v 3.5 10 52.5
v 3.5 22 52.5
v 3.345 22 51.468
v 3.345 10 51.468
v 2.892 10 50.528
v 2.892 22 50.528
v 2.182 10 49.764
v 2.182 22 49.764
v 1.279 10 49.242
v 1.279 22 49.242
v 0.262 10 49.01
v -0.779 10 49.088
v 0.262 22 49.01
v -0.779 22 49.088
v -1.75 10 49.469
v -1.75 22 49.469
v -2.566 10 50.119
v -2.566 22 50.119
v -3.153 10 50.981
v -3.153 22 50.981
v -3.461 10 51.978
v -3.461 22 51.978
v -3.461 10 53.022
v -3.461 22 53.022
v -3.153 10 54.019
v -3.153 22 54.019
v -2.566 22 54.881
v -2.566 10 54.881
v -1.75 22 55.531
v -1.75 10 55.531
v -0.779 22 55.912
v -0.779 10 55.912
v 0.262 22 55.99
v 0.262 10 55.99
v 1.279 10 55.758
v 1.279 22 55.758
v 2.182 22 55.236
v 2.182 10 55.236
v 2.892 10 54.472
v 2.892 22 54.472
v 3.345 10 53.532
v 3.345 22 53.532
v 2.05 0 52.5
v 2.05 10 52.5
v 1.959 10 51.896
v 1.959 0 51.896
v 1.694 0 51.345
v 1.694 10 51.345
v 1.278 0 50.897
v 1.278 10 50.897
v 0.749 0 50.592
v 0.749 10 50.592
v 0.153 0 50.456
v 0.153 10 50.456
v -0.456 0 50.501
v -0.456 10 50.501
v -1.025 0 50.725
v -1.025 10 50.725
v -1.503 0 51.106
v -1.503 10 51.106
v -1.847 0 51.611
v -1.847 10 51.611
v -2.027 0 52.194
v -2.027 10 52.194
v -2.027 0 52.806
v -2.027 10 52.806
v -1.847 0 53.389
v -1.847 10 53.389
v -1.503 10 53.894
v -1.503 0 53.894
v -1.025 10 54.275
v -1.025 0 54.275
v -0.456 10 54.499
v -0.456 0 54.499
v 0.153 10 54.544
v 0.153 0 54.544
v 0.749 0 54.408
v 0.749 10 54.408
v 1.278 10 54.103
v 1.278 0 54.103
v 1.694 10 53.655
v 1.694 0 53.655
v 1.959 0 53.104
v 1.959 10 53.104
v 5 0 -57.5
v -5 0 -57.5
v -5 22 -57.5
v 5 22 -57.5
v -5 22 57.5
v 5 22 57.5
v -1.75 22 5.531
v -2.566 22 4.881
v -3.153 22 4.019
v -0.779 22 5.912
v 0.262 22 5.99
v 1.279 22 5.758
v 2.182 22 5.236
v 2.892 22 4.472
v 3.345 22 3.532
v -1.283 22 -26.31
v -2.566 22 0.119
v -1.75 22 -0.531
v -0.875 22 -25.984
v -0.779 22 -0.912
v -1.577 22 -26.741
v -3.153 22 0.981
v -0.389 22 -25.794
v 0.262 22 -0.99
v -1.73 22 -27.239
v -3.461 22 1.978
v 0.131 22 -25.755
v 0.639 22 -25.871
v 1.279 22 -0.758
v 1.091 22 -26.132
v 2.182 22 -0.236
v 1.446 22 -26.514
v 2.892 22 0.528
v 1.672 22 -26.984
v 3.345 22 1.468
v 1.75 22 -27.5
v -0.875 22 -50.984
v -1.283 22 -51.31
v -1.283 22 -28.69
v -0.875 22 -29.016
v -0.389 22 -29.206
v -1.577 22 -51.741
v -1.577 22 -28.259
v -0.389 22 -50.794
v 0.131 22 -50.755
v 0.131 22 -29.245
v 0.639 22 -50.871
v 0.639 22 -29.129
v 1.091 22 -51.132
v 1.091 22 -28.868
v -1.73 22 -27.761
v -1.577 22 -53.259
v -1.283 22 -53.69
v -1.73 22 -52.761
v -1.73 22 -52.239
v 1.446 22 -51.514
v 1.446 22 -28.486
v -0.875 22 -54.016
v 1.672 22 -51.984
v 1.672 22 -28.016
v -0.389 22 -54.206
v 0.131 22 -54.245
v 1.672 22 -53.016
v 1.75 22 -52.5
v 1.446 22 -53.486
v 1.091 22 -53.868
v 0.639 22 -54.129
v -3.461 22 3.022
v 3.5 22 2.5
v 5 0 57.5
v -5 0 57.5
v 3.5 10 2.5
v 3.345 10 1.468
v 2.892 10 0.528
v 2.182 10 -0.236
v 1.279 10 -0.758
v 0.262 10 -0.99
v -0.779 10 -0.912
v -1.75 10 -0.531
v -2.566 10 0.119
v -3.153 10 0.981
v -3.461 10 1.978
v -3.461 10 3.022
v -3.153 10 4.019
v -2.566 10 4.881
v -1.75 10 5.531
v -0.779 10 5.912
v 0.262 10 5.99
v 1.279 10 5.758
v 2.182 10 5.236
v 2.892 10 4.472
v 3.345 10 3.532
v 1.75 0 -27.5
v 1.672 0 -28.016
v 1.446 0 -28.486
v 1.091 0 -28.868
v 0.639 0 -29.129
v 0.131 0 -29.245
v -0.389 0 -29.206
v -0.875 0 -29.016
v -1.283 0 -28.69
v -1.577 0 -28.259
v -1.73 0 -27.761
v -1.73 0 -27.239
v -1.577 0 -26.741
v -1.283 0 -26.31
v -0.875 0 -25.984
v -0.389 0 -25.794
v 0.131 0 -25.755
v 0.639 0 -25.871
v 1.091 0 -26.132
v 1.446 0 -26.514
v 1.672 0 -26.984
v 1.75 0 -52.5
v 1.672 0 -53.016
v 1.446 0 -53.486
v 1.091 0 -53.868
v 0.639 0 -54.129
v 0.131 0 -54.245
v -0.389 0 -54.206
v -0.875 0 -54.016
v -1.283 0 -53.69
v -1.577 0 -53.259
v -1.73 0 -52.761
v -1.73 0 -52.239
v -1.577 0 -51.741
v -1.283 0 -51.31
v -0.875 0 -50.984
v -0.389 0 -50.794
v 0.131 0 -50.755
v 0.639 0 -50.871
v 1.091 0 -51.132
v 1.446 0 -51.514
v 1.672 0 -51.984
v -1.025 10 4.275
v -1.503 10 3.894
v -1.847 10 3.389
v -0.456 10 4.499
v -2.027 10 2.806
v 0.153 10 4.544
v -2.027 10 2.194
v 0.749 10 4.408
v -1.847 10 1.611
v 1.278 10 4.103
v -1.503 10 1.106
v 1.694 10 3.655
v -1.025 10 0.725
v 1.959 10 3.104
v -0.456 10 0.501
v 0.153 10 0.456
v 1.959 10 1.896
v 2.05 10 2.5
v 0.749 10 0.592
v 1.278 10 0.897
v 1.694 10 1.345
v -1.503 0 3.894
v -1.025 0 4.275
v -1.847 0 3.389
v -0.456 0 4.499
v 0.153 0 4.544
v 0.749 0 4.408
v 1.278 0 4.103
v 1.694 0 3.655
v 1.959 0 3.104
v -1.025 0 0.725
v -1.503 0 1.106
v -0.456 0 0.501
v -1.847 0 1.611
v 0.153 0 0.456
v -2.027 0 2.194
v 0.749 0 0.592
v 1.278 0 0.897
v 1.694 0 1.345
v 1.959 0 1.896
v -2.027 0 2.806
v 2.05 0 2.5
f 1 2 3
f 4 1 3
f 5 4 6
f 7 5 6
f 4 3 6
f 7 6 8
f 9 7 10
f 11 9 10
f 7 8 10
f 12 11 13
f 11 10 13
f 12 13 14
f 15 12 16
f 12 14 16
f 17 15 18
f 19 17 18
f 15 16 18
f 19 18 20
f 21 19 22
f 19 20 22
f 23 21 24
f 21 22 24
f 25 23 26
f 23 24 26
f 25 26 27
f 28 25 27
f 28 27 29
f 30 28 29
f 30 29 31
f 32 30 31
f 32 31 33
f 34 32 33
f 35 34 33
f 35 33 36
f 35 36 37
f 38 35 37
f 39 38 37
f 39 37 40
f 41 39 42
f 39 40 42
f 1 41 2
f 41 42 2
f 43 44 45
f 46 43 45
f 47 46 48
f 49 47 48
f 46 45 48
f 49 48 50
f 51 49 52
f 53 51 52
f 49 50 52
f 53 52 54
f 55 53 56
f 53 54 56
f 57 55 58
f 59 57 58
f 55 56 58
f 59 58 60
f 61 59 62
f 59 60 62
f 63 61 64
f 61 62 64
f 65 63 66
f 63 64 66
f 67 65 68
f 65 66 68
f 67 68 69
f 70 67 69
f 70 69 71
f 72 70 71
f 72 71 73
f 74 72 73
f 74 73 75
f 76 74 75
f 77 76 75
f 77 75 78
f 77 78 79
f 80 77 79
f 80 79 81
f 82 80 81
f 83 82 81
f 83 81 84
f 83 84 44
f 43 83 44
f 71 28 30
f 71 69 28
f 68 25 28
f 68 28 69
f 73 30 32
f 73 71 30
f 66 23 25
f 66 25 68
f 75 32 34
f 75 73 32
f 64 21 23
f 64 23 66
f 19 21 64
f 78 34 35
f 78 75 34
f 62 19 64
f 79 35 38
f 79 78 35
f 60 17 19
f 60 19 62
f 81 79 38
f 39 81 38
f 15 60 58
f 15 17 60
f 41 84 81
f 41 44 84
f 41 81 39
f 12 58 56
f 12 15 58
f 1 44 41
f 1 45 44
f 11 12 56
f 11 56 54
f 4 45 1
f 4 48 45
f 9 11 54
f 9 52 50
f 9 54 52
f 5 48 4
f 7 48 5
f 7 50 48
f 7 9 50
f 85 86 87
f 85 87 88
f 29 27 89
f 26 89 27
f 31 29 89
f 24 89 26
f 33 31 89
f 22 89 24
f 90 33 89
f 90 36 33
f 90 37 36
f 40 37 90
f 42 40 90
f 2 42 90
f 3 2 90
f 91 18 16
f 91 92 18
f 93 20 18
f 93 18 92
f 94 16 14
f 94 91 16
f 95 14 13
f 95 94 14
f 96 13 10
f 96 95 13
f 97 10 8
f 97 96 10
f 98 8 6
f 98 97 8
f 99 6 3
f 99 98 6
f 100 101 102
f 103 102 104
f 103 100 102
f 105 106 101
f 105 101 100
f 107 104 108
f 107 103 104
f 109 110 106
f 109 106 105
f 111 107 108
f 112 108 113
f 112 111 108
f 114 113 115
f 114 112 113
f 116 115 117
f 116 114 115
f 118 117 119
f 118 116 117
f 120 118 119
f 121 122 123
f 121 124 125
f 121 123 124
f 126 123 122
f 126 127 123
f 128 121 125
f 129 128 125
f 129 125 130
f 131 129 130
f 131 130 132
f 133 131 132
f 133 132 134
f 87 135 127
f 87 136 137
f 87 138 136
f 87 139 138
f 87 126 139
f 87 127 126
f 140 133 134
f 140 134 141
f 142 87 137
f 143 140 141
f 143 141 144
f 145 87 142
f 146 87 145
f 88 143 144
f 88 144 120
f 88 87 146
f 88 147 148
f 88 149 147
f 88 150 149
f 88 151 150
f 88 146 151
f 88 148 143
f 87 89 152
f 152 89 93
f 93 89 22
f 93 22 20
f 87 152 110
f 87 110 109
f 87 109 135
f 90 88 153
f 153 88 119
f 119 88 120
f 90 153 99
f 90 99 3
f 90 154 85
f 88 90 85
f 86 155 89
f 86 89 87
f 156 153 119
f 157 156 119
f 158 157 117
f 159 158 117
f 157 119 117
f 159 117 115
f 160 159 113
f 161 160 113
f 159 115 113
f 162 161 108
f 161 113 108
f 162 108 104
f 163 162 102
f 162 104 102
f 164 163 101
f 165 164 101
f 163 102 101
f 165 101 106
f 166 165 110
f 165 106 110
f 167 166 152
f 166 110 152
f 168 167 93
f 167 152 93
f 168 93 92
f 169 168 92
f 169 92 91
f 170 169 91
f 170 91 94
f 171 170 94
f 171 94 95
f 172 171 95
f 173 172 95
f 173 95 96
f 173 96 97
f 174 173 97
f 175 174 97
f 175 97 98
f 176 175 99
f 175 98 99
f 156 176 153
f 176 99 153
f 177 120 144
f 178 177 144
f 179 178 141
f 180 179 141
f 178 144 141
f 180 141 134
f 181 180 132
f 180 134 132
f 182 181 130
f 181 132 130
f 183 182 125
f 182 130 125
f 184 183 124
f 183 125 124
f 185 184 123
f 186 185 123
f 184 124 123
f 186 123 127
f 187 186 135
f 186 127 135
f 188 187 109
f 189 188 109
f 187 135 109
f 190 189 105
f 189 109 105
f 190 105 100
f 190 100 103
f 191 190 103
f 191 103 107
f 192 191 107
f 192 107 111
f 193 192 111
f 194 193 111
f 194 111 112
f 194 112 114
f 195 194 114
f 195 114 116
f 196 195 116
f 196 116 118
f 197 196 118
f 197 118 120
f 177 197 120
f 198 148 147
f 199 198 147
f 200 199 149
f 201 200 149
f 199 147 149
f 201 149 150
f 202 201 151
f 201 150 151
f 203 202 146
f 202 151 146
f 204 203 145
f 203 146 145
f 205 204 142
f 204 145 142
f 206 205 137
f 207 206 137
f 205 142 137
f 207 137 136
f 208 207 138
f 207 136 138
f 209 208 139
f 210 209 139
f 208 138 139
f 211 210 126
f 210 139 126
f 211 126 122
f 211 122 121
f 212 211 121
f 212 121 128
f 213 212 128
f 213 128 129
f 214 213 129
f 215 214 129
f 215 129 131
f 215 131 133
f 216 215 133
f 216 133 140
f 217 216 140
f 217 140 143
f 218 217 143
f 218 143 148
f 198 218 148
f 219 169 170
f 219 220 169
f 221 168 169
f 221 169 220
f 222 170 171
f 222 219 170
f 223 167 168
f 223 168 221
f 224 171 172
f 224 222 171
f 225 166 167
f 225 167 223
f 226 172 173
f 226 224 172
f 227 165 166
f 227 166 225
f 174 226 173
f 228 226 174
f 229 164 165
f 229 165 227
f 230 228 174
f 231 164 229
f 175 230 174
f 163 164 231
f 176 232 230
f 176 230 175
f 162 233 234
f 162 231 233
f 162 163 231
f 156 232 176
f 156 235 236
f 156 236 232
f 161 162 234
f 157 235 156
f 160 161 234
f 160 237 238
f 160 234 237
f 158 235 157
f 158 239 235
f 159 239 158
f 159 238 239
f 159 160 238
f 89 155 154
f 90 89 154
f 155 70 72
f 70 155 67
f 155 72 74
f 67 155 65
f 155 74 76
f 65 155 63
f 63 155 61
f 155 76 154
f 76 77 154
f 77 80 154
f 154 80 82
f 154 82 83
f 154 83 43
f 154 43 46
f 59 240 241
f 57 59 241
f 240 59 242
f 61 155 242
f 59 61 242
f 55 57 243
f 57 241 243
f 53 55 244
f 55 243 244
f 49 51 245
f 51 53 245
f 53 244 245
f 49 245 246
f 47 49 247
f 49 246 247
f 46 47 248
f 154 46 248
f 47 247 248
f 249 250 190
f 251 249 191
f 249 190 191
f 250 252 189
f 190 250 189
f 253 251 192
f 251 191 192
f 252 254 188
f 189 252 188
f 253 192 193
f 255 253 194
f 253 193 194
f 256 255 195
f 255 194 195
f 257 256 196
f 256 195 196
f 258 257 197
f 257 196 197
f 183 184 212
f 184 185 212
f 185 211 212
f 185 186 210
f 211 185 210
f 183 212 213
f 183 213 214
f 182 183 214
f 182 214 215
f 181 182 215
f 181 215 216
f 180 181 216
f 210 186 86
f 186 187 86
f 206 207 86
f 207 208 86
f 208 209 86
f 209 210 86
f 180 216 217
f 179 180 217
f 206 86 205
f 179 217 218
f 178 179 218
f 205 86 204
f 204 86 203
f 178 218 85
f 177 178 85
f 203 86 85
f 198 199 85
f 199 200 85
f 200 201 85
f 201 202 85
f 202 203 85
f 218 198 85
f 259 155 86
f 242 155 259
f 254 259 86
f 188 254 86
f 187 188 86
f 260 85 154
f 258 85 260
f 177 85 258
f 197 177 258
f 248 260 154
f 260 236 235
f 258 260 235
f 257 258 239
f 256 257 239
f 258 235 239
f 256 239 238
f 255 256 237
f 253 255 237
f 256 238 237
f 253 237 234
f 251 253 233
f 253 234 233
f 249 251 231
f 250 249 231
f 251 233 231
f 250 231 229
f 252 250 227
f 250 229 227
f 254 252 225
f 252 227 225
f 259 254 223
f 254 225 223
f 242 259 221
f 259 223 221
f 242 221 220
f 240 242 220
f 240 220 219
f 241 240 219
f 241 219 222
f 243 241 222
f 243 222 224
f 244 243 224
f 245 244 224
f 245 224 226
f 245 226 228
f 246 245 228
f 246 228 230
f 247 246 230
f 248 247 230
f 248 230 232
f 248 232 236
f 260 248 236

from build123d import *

# Parameters (mm, degrees)
SKETCH1_W           = 10
SKETCH1_H           = 115
BOSS_EXTRUDE1_DEPTH = 22
SKETCH3_R           = 2.05
CUT_EXTRUDE1_DEPTH  = 22
SKETCH4_R           = 3.5
CUT_EXTRUDE2_DEPTH  = 12
SKETCH7_R           = 1.75
CUT_EXTRUDE3_DEPTH  = 23


with BuildPart() as part:
    # Sketch1 → Boss-Extrude1 (new body)
    with BuildSketch(Plane(origin=(0, 0, 0), x_dir=(1, 0, 0), z_dir=(0, 1, 0))):
        Rectangle(SKETCH1_W, SKETCH1_H)
    extrude(amount=BOSS_EXTRUDE1_DEPTH)

    # Sketch3 → Cut-Extrude1 (cut)
    with BuildSketch(Plane(origin=(0, 22, 0), x_dir=(1, 0, 0), z_dir=(0, 1, 0))):
        with Locations((0, -52.5)):
            Circle(SKETCH3_R)
        with Locations((0, -2.5)):
            Circle(SKETCH3_R)
    extrude(amount=-CUT_EXTRUDE1_DEPTH, mode=Mode.SUBTRACT)

    # Sketch4 → Cut-Extrude2 (cut)
    with BuildSketch(Plane(origin=(0, 22, 0), x_dir=(1, 0, 0), z_dir=(0, 1, 0))):
        with Locations((0, -52.5)):
            Circle(SKETCH4_R)
        with Locations((0, -2.5)):
            Circle(SKETCH4_R)
    extrude(amount=-CUT_EXTRUDE2_DEPTH, mode=Mode.SUBTRACT)

    # Sketch7 → Cut-Extrude3 (cut, through all)
    with BuildSketch(Plane(origin=(0, 22, 0), x_dir=(1, 0, 0), z_dir=(0, 1, 0))):
        with Locations((0, 52.5)):
            Circle(SKETCH7_R)
        with Locations((0, 27.5)):
            Circle(SKETCH7_R)
    extrude(amount=-CUT_EXTRUDE3_DEPTH, mode=Mode.SUBTRACT)


solid = part.part
